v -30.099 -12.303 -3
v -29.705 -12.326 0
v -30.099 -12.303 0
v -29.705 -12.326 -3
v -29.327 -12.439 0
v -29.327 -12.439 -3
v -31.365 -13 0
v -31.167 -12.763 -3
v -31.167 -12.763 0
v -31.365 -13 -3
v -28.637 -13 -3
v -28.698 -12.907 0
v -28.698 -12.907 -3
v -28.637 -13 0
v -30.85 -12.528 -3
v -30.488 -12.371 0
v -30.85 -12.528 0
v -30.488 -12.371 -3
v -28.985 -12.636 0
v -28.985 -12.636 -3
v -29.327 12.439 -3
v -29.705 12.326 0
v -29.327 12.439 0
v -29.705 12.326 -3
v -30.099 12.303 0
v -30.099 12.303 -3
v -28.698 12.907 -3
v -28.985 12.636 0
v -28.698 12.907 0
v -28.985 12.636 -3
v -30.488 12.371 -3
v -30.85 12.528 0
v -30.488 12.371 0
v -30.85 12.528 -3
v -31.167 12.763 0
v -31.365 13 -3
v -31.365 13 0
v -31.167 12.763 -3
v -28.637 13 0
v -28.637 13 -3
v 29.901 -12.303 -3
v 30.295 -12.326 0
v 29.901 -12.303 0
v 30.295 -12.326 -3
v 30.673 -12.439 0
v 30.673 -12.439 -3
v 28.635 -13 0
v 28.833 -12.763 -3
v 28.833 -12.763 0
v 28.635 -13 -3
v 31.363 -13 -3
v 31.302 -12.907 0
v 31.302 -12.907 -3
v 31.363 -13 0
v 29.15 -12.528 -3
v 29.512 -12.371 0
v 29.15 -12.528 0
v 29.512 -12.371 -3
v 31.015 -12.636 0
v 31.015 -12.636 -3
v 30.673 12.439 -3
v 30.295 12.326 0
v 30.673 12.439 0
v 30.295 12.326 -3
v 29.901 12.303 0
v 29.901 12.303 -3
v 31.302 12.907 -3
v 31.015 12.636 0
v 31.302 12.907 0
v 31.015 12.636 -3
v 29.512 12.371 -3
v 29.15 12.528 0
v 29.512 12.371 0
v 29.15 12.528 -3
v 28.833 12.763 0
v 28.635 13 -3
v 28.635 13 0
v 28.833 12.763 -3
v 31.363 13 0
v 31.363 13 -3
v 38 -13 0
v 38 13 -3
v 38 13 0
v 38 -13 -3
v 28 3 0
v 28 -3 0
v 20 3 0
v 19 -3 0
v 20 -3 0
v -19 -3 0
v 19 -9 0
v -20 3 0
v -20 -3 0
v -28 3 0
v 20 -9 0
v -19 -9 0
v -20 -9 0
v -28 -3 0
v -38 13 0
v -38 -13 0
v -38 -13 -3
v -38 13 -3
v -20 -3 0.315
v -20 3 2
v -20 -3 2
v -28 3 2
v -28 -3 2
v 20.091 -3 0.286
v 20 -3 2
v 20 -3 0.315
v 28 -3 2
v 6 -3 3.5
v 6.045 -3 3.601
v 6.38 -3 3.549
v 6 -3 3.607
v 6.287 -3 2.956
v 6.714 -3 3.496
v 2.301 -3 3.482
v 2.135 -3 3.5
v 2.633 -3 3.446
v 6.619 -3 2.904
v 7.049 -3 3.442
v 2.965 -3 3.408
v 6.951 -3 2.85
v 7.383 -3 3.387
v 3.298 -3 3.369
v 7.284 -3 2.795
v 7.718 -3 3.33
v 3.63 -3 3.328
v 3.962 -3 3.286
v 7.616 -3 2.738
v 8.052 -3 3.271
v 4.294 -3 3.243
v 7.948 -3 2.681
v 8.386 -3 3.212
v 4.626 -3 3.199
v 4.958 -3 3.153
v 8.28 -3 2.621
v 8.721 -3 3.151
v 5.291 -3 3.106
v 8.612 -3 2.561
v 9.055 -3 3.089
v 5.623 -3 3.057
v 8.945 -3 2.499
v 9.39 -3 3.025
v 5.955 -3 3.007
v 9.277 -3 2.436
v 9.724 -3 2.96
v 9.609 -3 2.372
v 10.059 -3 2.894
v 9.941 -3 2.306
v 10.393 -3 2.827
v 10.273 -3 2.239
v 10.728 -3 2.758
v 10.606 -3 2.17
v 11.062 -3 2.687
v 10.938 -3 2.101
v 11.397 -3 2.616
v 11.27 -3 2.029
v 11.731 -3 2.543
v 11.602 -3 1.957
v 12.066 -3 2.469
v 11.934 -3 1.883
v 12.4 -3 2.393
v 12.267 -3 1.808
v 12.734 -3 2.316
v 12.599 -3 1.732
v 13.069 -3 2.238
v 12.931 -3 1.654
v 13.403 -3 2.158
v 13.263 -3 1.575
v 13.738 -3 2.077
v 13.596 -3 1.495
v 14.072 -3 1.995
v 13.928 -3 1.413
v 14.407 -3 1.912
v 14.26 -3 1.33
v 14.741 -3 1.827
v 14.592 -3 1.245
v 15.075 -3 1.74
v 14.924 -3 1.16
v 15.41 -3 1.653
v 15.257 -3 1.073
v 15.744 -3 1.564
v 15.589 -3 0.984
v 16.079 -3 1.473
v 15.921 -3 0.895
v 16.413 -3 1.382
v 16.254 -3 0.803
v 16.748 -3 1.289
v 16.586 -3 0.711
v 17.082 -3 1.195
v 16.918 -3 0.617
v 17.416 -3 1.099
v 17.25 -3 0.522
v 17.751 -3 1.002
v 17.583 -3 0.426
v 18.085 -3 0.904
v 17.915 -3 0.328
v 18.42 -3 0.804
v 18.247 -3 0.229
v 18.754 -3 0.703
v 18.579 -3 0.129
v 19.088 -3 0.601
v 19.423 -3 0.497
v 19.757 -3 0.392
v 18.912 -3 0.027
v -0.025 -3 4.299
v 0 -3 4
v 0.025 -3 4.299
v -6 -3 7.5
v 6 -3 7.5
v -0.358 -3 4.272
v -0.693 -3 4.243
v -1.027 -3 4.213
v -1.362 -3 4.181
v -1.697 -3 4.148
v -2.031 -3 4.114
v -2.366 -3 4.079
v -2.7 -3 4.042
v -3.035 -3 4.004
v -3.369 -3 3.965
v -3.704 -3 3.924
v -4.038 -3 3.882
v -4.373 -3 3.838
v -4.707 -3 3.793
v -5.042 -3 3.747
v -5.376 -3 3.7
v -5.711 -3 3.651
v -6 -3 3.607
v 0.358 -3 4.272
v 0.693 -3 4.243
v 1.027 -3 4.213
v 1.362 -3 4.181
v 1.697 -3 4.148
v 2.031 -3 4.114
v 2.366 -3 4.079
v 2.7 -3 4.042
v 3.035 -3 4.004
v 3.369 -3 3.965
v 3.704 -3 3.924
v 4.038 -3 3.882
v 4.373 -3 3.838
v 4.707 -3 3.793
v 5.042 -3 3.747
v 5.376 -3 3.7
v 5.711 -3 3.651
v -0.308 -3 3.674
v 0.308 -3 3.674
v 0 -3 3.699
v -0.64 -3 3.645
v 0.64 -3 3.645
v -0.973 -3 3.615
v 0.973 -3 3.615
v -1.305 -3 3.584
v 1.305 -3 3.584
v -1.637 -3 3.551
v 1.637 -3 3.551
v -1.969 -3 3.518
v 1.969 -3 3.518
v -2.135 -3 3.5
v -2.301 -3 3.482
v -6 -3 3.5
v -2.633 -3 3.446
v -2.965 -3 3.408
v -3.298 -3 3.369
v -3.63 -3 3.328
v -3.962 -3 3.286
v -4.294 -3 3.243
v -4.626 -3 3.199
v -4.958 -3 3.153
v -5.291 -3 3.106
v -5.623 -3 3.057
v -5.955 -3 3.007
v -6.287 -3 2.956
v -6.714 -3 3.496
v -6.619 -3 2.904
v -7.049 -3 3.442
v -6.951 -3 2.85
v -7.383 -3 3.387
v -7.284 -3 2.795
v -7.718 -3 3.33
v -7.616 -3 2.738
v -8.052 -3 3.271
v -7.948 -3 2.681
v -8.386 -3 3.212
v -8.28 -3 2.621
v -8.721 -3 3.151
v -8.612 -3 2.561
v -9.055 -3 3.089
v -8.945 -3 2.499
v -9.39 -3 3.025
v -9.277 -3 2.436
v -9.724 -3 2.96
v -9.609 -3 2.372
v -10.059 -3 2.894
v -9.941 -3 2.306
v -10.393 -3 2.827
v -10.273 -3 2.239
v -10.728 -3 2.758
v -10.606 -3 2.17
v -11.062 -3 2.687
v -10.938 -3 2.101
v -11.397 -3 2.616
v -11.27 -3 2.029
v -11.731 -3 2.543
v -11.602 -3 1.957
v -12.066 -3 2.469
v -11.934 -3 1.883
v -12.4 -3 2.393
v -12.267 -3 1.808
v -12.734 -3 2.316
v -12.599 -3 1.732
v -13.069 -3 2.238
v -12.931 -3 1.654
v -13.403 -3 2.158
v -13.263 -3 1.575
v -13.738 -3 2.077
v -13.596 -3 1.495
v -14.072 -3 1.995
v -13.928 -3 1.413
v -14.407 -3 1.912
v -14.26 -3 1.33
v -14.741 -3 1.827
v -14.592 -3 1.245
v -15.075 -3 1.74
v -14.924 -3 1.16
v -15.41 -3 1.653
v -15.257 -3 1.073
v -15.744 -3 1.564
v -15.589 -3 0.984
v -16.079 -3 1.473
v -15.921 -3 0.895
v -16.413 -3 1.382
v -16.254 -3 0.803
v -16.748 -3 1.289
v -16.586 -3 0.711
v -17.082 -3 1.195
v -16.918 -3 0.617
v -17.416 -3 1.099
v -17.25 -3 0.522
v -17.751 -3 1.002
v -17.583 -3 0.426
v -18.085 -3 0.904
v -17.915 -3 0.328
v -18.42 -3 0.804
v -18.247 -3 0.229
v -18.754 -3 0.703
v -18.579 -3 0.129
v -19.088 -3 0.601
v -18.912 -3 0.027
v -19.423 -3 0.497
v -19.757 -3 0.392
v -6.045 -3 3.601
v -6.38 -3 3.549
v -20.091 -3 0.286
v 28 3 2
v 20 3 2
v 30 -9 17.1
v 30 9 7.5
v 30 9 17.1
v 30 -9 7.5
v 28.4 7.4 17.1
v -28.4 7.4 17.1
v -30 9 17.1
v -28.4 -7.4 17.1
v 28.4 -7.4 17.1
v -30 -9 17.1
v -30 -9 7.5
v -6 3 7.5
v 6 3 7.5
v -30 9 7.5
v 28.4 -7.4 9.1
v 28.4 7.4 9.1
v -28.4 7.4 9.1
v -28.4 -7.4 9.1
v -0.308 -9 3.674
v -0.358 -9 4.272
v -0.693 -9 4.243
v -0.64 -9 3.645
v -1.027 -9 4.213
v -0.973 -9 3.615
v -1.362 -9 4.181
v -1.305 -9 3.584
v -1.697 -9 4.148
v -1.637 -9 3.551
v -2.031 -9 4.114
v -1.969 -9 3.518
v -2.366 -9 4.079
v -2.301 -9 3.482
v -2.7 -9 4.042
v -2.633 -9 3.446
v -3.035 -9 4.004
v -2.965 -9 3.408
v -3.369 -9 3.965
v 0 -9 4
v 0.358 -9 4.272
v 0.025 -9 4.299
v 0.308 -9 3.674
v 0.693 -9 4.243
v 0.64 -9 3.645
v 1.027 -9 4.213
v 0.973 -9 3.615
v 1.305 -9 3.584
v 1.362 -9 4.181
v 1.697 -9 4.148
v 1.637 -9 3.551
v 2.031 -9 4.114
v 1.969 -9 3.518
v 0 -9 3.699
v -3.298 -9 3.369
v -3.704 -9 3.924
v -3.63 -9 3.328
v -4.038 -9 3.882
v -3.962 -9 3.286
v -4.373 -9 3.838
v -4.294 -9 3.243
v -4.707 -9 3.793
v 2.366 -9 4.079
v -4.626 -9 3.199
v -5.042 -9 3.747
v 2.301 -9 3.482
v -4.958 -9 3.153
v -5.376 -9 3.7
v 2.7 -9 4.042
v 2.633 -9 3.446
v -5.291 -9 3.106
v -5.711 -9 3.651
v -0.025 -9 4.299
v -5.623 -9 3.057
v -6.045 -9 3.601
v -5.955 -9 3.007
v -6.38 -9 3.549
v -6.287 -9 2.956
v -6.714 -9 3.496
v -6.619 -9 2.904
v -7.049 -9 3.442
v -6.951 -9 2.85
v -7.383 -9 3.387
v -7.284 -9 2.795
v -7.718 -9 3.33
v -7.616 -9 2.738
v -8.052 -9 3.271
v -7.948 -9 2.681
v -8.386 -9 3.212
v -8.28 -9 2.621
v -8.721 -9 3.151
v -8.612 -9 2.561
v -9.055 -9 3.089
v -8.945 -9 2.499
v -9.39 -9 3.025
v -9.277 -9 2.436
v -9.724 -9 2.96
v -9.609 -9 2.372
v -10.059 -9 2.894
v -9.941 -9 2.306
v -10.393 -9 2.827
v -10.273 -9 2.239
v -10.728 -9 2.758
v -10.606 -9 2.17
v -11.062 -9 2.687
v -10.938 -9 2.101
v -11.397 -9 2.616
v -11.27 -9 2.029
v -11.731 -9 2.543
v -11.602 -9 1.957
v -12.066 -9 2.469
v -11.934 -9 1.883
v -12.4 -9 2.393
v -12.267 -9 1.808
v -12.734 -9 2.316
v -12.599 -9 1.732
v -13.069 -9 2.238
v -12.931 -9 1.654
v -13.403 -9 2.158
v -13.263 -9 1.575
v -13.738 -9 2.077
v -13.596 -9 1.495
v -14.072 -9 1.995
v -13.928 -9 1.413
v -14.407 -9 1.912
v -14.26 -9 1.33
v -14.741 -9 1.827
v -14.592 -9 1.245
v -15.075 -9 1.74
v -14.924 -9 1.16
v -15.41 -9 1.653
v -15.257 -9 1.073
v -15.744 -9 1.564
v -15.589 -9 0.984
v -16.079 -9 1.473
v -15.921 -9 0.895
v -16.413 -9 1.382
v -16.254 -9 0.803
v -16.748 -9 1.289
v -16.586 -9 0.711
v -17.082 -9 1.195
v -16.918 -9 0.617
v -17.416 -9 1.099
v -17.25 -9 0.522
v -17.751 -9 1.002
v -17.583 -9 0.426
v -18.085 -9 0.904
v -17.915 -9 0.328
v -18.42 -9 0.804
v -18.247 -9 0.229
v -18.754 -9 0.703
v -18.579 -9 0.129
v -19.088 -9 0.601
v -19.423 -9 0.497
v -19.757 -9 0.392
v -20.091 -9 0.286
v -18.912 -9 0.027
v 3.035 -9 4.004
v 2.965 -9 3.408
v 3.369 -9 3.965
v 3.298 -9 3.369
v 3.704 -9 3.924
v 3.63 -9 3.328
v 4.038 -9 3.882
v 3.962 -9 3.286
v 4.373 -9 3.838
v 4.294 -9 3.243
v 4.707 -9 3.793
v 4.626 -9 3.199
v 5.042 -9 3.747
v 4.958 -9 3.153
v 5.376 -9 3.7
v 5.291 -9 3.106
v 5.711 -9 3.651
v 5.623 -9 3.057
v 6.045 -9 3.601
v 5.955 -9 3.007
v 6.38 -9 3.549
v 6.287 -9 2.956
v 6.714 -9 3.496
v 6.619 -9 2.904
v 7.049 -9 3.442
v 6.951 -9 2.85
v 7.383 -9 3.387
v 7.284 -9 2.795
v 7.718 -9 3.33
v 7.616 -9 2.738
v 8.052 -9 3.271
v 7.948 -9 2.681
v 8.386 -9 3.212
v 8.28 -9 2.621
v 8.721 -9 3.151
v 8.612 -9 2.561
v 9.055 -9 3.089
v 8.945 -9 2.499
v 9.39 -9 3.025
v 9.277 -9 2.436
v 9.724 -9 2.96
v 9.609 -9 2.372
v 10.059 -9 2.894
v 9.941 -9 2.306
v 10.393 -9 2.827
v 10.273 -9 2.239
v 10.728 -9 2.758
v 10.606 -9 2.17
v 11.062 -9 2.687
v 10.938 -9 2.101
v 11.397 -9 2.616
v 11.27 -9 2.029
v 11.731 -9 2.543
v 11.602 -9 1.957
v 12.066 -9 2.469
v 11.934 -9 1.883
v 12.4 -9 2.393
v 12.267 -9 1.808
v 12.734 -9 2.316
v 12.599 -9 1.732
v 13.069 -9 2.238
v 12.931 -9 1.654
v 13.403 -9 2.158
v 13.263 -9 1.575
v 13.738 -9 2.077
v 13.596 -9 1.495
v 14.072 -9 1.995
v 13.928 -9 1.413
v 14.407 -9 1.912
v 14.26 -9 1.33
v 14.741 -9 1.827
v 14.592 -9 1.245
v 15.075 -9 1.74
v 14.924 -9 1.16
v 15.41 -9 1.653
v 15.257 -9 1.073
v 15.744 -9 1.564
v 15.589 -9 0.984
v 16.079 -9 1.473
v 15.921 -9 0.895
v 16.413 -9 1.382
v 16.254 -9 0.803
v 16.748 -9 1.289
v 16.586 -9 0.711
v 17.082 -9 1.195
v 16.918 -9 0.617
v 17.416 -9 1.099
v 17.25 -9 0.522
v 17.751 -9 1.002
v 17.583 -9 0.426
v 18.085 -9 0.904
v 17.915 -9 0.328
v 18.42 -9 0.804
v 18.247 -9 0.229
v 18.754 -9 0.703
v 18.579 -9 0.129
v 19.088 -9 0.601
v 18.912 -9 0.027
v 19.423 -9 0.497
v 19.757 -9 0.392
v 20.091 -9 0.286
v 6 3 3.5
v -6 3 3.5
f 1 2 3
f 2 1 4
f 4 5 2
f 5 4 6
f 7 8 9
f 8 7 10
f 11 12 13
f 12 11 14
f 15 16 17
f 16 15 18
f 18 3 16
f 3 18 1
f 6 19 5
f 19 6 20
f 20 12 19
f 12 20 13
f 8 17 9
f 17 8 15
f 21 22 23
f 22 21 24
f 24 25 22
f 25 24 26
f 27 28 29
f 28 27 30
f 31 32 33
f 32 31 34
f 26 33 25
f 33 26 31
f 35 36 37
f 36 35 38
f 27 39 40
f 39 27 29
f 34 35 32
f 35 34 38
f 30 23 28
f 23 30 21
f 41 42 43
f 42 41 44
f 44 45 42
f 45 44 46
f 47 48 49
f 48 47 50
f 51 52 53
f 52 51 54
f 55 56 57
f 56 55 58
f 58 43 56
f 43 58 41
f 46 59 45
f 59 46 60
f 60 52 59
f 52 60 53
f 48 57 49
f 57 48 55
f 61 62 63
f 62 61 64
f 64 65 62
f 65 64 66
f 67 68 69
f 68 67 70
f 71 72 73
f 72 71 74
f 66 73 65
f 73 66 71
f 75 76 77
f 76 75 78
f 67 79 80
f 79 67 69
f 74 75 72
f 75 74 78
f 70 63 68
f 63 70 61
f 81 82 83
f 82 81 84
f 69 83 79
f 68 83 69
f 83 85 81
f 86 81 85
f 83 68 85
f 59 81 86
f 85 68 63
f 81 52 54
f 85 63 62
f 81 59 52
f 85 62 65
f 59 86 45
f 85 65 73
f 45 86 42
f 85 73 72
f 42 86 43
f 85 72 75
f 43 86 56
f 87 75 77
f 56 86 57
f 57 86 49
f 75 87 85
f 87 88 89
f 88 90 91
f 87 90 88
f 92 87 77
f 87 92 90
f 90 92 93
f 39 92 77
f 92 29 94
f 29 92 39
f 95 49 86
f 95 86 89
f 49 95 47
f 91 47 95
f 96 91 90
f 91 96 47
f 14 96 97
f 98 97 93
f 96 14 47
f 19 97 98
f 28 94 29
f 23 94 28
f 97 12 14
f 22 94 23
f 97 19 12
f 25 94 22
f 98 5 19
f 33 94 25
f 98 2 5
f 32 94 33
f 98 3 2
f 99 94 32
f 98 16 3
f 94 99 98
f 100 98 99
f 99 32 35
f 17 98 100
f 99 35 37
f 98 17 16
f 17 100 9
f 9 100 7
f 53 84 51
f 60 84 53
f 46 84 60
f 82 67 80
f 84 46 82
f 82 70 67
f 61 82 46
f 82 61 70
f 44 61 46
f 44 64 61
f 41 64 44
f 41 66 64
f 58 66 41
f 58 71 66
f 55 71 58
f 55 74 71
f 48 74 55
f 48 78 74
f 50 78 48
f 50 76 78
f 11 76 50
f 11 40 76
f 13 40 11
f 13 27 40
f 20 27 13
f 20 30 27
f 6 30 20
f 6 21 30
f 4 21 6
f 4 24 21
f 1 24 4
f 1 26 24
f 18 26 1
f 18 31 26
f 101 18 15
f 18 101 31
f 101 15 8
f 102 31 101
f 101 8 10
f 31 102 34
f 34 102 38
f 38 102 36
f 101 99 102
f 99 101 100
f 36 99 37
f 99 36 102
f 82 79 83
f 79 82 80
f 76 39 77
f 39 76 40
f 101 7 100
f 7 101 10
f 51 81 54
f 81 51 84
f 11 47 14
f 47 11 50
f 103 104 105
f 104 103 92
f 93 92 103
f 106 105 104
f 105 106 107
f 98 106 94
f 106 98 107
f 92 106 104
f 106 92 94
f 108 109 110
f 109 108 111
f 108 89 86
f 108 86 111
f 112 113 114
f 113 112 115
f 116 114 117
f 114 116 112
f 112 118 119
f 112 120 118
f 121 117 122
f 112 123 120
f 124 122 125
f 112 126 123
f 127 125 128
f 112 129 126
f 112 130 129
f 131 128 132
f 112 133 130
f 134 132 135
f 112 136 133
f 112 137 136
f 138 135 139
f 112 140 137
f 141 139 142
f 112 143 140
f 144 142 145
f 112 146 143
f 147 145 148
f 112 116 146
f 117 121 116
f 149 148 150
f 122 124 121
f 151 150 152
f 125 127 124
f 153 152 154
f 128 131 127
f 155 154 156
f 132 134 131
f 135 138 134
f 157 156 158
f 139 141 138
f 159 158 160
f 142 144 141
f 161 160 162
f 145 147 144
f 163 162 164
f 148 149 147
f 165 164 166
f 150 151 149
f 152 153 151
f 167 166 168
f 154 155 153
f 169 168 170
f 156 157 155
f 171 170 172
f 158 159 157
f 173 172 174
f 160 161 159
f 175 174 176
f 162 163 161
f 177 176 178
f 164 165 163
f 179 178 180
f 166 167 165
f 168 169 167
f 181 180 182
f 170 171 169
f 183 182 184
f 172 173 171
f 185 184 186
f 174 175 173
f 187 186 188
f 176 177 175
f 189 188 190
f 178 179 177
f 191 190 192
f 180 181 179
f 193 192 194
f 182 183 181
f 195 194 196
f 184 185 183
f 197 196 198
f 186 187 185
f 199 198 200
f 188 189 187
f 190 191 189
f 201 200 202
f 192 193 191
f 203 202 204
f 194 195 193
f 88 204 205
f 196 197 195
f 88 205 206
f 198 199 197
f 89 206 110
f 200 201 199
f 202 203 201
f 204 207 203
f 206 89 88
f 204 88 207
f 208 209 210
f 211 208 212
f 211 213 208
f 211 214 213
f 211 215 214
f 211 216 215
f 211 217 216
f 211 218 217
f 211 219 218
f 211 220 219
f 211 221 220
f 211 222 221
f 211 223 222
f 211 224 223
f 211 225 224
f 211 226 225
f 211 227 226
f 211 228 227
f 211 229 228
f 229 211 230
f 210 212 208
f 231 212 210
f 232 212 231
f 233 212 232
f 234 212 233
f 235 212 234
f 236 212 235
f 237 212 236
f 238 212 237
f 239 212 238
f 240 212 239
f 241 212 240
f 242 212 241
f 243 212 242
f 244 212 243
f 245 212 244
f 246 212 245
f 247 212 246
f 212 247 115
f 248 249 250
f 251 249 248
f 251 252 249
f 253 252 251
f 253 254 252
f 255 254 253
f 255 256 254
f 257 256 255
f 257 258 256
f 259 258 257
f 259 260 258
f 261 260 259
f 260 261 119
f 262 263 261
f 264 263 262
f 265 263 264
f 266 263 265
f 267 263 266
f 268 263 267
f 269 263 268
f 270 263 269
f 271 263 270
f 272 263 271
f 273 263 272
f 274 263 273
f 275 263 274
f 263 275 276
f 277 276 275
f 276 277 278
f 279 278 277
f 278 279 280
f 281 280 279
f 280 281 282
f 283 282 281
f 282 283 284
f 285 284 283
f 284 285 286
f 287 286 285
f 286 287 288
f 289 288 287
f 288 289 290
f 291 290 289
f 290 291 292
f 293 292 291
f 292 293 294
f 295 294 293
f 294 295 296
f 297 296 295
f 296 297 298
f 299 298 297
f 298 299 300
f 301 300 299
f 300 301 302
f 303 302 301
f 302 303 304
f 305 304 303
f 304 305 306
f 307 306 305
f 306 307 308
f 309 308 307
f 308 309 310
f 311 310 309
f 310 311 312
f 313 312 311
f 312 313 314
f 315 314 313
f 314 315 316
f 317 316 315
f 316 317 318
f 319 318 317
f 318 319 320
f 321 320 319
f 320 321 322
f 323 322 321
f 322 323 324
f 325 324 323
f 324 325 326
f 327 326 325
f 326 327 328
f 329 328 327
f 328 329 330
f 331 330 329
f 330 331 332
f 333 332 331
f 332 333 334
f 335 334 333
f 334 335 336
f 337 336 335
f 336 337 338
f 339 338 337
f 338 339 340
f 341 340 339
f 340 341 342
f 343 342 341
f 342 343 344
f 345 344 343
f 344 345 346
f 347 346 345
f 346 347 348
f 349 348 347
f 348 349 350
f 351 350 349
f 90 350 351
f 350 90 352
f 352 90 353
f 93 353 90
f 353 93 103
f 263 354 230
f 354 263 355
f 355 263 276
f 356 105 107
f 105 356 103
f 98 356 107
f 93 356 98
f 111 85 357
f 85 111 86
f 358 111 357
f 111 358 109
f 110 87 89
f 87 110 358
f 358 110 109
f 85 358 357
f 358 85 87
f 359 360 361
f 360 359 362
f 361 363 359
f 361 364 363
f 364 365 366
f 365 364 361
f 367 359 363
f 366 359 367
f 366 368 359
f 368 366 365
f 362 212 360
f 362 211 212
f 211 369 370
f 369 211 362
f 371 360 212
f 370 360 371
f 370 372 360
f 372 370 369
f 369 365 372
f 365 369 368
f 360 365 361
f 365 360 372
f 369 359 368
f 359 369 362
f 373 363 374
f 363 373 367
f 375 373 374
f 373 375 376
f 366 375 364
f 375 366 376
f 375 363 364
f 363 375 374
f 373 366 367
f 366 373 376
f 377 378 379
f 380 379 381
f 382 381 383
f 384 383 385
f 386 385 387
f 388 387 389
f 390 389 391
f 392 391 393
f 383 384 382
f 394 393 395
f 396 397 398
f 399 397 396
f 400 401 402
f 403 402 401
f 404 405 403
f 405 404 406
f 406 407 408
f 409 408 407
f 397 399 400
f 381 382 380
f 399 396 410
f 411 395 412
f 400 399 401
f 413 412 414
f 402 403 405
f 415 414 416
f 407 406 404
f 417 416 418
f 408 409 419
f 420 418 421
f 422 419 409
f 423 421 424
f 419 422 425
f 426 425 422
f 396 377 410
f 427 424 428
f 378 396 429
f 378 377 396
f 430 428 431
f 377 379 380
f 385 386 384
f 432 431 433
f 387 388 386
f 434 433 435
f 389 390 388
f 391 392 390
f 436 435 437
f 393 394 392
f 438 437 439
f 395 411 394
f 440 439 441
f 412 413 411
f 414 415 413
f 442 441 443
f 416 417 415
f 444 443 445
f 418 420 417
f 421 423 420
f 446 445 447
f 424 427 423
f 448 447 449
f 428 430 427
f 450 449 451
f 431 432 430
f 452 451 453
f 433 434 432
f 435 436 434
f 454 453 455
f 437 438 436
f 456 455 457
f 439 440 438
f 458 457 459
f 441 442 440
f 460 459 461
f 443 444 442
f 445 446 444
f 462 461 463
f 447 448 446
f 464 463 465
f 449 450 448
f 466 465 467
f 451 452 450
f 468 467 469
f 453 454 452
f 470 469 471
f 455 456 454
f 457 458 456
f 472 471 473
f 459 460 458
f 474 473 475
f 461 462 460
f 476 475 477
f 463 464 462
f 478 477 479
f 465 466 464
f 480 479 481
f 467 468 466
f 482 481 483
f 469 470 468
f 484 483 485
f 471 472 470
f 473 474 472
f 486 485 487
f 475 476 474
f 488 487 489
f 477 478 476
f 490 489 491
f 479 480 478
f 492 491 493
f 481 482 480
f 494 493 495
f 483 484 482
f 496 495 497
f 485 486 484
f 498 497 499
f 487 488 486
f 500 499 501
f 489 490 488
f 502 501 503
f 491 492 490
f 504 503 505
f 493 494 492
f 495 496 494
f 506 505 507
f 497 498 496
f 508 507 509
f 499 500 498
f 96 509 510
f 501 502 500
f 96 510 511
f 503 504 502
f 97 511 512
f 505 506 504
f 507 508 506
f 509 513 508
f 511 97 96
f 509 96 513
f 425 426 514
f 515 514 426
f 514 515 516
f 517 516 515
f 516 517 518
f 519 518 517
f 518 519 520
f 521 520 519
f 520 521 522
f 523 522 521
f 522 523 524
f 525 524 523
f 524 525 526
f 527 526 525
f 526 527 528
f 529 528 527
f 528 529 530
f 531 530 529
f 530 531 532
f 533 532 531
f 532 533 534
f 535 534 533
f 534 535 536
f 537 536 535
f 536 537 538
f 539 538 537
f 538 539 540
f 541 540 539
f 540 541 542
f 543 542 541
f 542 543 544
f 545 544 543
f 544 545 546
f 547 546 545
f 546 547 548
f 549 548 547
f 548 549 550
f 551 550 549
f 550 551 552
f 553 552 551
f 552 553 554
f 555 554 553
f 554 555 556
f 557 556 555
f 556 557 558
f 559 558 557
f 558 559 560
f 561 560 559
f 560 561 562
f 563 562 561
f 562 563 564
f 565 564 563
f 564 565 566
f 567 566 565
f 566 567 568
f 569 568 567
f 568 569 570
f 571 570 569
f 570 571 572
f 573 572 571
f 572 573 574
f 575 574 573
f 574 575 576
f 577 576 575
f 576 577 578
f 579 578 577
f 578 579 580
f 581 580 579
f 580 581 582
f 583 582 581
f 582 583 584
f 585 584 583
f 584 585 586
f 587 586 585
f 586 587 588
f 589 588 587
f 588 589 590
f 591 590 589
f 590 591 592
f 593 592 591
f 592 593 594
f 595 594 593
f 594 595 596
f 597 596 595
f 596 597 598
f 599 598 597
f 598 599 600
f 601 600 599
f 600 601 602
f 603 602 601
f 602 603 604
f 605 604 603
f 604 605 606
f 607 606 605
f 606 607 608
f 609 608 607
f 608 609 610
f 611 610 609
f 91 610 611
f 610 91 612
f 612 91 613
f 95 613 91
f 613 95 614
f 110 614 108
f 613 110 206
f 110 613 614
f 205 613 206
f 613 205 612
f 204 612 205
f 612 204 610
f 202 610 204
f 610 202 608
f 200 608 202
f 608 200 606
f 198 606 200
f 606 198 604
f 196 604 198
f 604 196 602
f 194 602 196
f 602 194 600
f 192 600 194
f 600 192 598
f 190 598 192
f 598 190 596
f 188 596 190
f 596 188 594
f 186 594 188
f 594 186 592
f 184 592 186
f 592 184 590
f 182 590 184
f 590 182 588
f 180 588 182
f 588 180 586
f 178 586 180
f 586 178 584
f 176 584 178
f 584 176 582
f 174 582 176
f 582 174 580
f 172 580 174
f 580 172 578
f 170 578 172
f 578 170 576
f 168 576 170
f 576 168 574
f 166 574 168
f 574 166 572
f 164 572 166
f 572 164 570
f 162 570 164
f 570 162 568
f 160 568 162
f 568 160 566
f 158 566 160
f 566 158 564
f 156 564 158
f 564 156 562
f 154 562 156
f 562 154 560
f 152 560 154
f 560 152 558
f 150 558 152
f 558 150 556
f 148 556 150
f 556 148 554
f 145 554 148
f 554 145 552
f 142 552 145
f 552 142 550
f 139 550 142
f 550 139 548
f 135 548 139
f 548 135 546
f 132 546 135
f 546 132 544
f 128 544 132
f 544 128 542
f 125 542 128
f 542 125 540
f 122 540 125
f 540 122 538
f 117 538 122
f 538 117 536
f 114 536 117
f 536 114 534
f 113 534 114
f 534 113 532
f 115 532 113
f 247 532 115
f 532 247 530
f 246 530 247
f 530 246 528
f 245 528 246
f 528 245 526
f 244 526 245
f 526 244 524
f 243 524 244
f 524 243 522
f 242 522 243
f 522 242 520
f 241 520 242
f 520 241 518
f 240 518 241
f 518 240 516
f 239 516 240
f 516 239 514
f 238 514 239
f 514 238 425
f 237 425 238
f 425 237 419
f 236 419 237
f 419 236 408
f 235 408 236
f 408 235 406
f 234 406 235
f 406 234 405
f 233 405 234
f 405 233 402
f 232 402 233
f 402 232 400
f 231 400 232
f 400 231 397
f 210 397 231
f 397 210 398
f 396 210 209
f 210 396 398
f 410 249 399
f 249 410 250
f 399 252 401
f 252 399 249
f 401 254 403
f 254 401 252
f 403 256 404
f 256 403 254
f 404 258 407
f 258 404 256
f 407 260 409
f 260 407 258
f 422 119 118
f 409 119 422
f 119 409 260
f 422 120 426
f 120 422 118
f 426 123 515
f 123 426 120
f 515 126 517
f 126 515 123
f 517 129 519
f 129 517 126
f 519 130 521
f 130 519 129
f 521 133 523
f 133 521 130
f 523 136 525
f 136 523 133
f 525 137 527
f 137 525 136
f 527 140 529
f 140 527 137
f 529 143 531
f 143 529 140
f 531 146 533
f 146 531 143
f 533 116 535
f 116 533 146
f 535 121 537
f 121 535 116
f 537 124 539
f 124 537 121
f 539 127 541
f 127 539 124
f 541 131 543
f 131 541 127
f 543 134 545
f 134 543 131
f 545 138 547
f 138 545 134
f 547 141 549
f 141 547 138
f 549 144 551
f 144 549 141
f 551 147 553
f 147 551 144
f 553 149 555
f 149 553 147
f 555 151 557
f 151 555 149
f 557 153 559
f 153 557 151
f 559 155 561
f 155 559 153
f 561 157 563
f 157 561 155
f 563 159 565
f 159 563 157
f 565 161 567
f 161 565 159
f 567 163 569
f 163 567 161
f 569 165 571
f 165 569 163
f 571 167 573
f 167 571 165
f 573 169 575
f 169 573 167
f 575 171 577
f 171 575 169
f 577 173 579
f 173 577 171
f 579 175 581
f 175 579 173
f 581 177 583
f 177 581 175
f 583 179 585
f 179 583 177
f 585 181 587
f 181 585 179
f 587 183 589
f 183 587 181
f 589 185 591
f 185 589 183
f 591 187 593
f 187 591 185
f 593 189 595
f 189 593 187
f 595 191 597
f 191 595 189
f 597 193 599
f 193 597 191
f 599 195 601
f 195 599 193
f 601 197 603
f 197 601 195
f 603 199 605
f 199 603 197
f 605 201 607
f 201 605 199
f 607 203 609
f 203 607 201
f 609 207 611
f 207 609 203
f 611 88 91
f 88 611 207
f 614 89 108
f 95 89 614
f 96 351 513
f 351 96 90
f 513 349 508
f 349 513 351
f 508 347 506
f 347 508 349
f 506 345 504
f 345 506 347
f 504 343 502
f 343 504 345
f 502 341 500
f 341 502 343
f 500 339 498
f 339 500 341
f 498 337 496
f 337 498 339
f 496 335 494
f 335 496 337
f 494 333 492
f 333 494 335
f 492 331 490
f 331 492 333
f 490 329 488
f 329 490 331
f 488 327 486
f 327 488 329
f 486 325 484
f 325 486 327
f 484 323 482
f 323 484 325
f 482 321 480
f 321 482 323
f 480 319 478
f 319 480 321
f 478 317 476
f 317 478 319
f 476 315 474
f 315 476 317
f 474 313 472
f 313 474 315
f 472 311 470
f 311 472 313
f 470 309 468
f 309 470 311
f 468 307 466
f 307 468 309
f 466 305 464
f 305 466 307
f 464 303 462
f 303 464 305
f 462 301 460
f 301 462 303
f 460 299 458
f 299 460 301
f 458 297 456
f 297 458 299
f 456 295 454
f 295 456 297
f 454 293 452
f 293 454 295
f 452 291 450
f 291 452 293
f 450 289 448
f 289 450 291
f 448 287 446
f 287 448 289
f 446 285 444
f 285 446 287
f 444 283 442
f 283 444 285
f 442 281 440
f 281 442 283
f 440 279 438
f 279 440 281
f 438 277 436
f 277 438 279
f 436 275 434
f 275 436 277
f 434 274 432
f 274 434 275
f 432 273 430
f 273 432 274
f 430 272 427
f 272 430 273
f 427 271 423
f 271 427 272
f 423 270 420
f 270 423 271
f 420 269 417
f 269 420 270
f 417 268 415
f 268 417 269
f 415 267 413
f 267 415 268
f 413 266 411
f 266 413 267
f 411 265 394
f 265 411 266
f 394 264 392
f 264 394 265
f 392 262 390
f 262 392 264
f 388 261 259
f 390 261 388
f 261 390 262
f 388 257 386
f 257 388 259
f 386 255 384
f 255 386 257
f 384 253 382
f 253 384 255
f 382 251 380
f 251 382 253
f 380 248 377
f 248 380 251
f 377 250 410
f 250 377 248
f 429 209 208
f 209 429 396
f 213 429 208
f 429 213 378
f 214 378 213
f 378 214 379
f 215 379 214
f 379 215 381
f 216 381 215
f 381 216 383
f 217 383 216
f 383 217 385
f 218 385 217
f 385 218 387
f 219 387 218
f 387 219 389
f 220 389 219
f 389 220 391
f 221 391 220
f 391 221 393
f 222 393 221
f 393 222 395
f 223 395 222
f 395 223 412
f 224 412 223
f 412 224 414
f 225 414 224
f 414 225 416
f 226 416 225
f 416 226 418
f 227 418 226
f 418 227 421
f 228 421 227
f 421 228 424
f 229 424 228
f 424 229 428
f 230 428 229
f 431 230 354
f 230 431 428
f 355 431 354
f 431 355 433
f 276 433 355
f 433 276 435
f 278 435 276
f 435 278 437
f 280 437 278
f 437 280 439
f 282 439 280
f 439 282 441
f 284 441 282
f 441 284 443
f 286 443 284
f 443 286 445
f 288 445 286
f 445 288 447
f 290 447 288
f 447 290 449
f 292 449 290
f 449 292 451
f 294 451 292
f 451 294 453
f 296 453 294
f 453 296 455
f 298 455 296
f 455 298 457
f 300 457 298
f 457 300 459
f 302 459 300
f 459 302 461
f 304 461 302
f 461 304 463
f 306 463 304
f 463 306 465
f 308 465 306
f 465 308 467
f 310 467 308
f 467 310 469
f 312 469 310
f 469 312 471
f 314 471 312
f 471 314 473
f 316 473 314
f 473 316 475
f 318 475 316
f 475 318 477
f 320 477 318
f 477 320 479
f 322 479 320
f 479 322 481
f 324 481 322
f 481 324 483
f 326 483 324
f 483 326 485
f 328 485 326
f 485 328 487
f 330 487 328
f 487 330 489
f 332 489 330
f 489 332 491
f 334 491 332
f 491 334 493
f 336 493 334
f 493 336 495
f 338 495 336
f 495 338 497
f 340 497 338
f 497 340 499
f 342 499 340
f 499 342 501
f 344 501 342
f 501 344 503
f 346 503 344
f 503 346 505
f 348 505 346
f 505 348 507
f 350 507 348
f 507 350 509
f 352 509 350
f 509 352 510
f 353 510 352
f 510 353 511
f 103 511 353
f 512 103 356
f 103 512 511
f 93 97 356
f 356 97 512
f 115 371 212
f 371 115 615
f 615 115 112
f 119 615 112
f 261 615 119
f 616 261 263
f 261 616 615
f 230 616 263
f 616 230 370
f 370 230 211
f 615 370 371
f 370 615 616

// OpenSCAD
// =====================================================================
// bimodal_trough.scad
// ---------------------------------------------------------------------
// Parametric, monolithic 3D-printable model of the bimodal compliant
// trough mechanism analysed in scripts/bimodal_compliance.py.
//
// The geometry is a symmetric von Mises truss flexure pair (two shallow
// pre-curved beams joined at an apex) carrying a tiltable trough. The
// design is *monolithic* — the compliant pivots are the flexures
// themselves, so the printed part has no fasteners, no support, and no
// assembly (just bolt the base to the gantry). When pressed downward
// past the dead-centre line the apex snaps from the "scoop" pose to the
// "dump" pose; releasing the load returns it via the second well.
//
// The module is *parametric*: every dimension that the analyser uses is
// re-exposed here so a redesign in scripts/bimodal_compliance.py can be
// reflected by editing the corresponding variable below (and rerunning
// the analyser to confirm it's still bimodal).
//
// Render to STL from the CLI (no GUI required):
//
//     openscad -o cad/bimodal-trough.stl cad/bimodal_trough.scad
//
// Render an isometric preview PNG:
//
//     openscad -o cad/bimodal-trough-iso.png \
//         --imgsize=1100,800 --camera=0,0,8,55,0,25,180 \
//         --colorscheme=Tomorrow cad/bimodal_trough.scad
//
// Tested with OpenSCAD 2021.01.
// =====================================================================

// ---------- Parameters (mirror scripts/bimodal_compliance.py defaults)
half_span      = 20.0;   // b  : half distance between flexure feet [mm]
initial_rise   =  4.0;   // h0 : as-built rise of the apex above feet [mm]
flexure_thick  =  0.6;   // t  : flexure thickness in bending dir.   [mm]
flexure_width  =  6.0;   // w  : flexure width (out-of-plane)        [mm]

// ---------- Frame / base
base_thick     =  3.0;   // base plate thickness                     [mm]
base_pad       = 10.0;   // extra material around feet               [mm]
mount_hole_d   =  3.4;   // M3 clearance                             [mm]
mount_hole_dx  = 30.0;   // hole pitch along x                       [mm]
mount_hole_dy  = 14.0;   // hole pitch along y                       [mm]

// ---------- Trough (the powder-carrying channel sat on top of the apex)
trough_len     = 60.0;   // along the bed                            [mm]
trough_outer_w = 18.0;   // overall channel width                    [mm]
trough_wall    =  1.6;   // channel side-wall thickness              [mm]
trough_depth   =  8.0;   // channel depth                            [mm]
trough_floor   =  1.6;   // channel floor thickness                  [mm]
apex_block_h   =  4.0;   // height of the rigid apex block under the trough

// ---------- Pre-curve "kick" of the flexures
//   The analyser bakes pre-compression in mathematically (1.5%); the
//   printed part bakes it in *geometrically* by shaping each flexure
//   as a shallow arch whose chord is shorter than its arclength. That
//   way the stress-free printed shape already sits at one of the two
//   wells — no assembly pre-stress needed.
flex_arch_kick =  0.6;   // additional sag of the flexure midpoint   [mm]

// ---------- Render quality
$fa = 2;   // facet angle  [deg]
$fs = 0.4; // facet size   [mm]
flex_segments = 60;       // # of segments along each flexure arch

// =====================================================================
// Helpers
// =====================================================================

// A 2-D arch from (x0, y0) to (x1, y1). The straight chord between the
// endpoints is bulged above by ``mid_kick`` at the parametric midpoint
// (i.e. the curve is the chord plus a parabolic offset of ``mid_kick``
// at u=0.5). Returned as a list of [x, y] points.
//
// This shape is what bakes the geometric pre-compression into the
// printed flexure: the arclength of the curve is greater than the
// straight chord between foot and apex, so the as-printed beam is
// already pre-compressed with no assembly stress.
function arch_points(x0, x1, y0, y1, mid_kick, n) =
    [ for (i = [0 : n]) let (
        u  = i / n,
        x  = x0 + (x1 - x0) * u,
        y  = y0 + (y1 - y0) * u + 4 * mid_kick * u * (1 - u)
      ) [x, y] ];

// Build the two surfaces of a constant-thickness arched beam by
// offsetting the centreline normal to itself.
module arched_beam(x0, x1, y0, y1, mid_kick, thick, n) {
    pts = arch_points(x0, x1, y0, y1, mid_kick, n);
    // build top and bottom polylines by offsetting along local normals
    tops = [ for (i = [0 : n]) let (
        prev = pts[max(i-1, 0)],
        next = pts[min(i+1, n)],
        tx   = next[0] - prev[0],
        ty   = next[1] - prev[1],
        L    = sqrt(tx*tx + ty*ty),
        nx   = -ty / L,
        ny   =  tx / L
      ) [pts[i][0] + nx * thick / 2,
         pts[i][1] + ny * thick / 2] ];
    bots = [ for (i = [0 : n]) let (
        prev = pts[max(i-1, 0)],
        next = pts[min(i+1, n)],
        tx   = next[0] - prev[0],
        ty   = next[1] - prev[1],
        L    = sqrt(tx*tx + ty*ty),
        nx   = -ty / L,
        ny   =  tx / L
      ) [pts[i][0] - nx * thick / 2,
         pts[i][1] - ny * thick / 2] ];
    polygon(points = concat(tops, [for (i = [n : -1 : 0]) bots[i]]));
}

// =====================================================================
// Sub-assemblies
// =====================================================================

module base_plate() {
    foot_w = 8.0;
    plate_x = 2 * half_span + 2 * (foot_w + base_pad);
    plate_y = flexure_width + 2 * base_pad;
    difference() {
        translate([-plate_x/2, -plate_y/2, -base_thick])
            cube([plate_x, plate_y, base_thick]);
        // four M3 mounting holes on a rectangular pattern
        for (sx = [-1, 1]) for (sy = [-1, 1])
            translate([sx * mount_hole_dx, sy * mount_hole_dy, -base_thick - 0.1])
                cylinder(d = mount_hole_d, h = base_thick + 0.2);
    }
    // anchor blocks that root the flexures
    for (sx = [-1, 1])
        translate([sx * (half_span + foot_w/2) - foot_w/2, -flexure_width/2, 0])
            cube([foot_w, flexure_width, 2.0]);
}

// One pre-curved flexure (root at +half_span on the bed, apex at the
// trough centreline). Mirrored with ``side = -1`` for the other beam.
//
// The curve runs from foot ``(±half_span, 0)`` to apex ``(0, initial_rise)``
// — i.e. the beam *climbs* from the bed up to the apex carrier — and is
// bulged above the straight chord by ``flex_arch_kick`` at its
// midpoint. The kick is what gives the printed beam an arclength
// greater than its chord, baking in the geometric pre-compression that
// the analyser models mathematically (1.5 % shorter natural length than
// chord). Setting ``flex_arch_kick = 0`` would give a straight foot-to-
// apex flexure that is monostable.
module flexure(side = +1) {
    x_root = side * (half_span);
    x_apex = 0;
    // extrude the 2-D arched beam through the out-of-plane width
    translate([0, -flexure_width / 2, 0])
        rotate([90, 0, 0])
        rotate([0, 0, 0])
        linear_extrude(height = flexure_width)
        // the arch is laid out in (x, y); build it directly
        arched_beam(x_root, x_apex, 0, initial_rise,
                    flex_arch_kick, flexure_thick, flex_segments);
}

// Rigid apex carrier: a small block on top of the apex that the trough
// is fused to and that the two flexures merge into.
module apex_block() {
    bx = 12.0;
    by = flexure_width;
    bz = apex_block_h;
    translate([-bx/2, -by/2, initial_rise - 0.5])
        cube([bx, by, bz]);
}

// The powder-carrying trough sat on top of the apex carrier.
module trough() {
    z0 = initial_rise - 0.5 + apex_block_h;
    // outer body
    difference() {
        translate([-trough_len/2, -trough_outer_w/2, z0])
            cube([trough_len, trough_outer_w, trough_floor + trough_depth]);
        // hollow out the channel
        translate([-trough_len/2 + trough_wall,
                   -trough_outer_w/2 + trough_wall,
                    z0 + trough_floor])
            cube([trough_len - 2 * trough_wall,
                  trough_outer_w - 2 * trough_wall,
                  trough_depth + 1]);
    }
}

// =====================================================================
// Top-level assembly
// =====================================================================

module bimodal_trough() {
    color([0.85, 0.85, 0.88]) base_plate();
    color([0.95, 0.55, 0.45]) flexure(+1);
    color([0.95, 0.55, 0.45]) flexure(-1);
    color([0.85, 0.85, 0.88]) apex_block();
    color([0.85, 0.85, 0.88]) trough();
}

bimodal_trough();
